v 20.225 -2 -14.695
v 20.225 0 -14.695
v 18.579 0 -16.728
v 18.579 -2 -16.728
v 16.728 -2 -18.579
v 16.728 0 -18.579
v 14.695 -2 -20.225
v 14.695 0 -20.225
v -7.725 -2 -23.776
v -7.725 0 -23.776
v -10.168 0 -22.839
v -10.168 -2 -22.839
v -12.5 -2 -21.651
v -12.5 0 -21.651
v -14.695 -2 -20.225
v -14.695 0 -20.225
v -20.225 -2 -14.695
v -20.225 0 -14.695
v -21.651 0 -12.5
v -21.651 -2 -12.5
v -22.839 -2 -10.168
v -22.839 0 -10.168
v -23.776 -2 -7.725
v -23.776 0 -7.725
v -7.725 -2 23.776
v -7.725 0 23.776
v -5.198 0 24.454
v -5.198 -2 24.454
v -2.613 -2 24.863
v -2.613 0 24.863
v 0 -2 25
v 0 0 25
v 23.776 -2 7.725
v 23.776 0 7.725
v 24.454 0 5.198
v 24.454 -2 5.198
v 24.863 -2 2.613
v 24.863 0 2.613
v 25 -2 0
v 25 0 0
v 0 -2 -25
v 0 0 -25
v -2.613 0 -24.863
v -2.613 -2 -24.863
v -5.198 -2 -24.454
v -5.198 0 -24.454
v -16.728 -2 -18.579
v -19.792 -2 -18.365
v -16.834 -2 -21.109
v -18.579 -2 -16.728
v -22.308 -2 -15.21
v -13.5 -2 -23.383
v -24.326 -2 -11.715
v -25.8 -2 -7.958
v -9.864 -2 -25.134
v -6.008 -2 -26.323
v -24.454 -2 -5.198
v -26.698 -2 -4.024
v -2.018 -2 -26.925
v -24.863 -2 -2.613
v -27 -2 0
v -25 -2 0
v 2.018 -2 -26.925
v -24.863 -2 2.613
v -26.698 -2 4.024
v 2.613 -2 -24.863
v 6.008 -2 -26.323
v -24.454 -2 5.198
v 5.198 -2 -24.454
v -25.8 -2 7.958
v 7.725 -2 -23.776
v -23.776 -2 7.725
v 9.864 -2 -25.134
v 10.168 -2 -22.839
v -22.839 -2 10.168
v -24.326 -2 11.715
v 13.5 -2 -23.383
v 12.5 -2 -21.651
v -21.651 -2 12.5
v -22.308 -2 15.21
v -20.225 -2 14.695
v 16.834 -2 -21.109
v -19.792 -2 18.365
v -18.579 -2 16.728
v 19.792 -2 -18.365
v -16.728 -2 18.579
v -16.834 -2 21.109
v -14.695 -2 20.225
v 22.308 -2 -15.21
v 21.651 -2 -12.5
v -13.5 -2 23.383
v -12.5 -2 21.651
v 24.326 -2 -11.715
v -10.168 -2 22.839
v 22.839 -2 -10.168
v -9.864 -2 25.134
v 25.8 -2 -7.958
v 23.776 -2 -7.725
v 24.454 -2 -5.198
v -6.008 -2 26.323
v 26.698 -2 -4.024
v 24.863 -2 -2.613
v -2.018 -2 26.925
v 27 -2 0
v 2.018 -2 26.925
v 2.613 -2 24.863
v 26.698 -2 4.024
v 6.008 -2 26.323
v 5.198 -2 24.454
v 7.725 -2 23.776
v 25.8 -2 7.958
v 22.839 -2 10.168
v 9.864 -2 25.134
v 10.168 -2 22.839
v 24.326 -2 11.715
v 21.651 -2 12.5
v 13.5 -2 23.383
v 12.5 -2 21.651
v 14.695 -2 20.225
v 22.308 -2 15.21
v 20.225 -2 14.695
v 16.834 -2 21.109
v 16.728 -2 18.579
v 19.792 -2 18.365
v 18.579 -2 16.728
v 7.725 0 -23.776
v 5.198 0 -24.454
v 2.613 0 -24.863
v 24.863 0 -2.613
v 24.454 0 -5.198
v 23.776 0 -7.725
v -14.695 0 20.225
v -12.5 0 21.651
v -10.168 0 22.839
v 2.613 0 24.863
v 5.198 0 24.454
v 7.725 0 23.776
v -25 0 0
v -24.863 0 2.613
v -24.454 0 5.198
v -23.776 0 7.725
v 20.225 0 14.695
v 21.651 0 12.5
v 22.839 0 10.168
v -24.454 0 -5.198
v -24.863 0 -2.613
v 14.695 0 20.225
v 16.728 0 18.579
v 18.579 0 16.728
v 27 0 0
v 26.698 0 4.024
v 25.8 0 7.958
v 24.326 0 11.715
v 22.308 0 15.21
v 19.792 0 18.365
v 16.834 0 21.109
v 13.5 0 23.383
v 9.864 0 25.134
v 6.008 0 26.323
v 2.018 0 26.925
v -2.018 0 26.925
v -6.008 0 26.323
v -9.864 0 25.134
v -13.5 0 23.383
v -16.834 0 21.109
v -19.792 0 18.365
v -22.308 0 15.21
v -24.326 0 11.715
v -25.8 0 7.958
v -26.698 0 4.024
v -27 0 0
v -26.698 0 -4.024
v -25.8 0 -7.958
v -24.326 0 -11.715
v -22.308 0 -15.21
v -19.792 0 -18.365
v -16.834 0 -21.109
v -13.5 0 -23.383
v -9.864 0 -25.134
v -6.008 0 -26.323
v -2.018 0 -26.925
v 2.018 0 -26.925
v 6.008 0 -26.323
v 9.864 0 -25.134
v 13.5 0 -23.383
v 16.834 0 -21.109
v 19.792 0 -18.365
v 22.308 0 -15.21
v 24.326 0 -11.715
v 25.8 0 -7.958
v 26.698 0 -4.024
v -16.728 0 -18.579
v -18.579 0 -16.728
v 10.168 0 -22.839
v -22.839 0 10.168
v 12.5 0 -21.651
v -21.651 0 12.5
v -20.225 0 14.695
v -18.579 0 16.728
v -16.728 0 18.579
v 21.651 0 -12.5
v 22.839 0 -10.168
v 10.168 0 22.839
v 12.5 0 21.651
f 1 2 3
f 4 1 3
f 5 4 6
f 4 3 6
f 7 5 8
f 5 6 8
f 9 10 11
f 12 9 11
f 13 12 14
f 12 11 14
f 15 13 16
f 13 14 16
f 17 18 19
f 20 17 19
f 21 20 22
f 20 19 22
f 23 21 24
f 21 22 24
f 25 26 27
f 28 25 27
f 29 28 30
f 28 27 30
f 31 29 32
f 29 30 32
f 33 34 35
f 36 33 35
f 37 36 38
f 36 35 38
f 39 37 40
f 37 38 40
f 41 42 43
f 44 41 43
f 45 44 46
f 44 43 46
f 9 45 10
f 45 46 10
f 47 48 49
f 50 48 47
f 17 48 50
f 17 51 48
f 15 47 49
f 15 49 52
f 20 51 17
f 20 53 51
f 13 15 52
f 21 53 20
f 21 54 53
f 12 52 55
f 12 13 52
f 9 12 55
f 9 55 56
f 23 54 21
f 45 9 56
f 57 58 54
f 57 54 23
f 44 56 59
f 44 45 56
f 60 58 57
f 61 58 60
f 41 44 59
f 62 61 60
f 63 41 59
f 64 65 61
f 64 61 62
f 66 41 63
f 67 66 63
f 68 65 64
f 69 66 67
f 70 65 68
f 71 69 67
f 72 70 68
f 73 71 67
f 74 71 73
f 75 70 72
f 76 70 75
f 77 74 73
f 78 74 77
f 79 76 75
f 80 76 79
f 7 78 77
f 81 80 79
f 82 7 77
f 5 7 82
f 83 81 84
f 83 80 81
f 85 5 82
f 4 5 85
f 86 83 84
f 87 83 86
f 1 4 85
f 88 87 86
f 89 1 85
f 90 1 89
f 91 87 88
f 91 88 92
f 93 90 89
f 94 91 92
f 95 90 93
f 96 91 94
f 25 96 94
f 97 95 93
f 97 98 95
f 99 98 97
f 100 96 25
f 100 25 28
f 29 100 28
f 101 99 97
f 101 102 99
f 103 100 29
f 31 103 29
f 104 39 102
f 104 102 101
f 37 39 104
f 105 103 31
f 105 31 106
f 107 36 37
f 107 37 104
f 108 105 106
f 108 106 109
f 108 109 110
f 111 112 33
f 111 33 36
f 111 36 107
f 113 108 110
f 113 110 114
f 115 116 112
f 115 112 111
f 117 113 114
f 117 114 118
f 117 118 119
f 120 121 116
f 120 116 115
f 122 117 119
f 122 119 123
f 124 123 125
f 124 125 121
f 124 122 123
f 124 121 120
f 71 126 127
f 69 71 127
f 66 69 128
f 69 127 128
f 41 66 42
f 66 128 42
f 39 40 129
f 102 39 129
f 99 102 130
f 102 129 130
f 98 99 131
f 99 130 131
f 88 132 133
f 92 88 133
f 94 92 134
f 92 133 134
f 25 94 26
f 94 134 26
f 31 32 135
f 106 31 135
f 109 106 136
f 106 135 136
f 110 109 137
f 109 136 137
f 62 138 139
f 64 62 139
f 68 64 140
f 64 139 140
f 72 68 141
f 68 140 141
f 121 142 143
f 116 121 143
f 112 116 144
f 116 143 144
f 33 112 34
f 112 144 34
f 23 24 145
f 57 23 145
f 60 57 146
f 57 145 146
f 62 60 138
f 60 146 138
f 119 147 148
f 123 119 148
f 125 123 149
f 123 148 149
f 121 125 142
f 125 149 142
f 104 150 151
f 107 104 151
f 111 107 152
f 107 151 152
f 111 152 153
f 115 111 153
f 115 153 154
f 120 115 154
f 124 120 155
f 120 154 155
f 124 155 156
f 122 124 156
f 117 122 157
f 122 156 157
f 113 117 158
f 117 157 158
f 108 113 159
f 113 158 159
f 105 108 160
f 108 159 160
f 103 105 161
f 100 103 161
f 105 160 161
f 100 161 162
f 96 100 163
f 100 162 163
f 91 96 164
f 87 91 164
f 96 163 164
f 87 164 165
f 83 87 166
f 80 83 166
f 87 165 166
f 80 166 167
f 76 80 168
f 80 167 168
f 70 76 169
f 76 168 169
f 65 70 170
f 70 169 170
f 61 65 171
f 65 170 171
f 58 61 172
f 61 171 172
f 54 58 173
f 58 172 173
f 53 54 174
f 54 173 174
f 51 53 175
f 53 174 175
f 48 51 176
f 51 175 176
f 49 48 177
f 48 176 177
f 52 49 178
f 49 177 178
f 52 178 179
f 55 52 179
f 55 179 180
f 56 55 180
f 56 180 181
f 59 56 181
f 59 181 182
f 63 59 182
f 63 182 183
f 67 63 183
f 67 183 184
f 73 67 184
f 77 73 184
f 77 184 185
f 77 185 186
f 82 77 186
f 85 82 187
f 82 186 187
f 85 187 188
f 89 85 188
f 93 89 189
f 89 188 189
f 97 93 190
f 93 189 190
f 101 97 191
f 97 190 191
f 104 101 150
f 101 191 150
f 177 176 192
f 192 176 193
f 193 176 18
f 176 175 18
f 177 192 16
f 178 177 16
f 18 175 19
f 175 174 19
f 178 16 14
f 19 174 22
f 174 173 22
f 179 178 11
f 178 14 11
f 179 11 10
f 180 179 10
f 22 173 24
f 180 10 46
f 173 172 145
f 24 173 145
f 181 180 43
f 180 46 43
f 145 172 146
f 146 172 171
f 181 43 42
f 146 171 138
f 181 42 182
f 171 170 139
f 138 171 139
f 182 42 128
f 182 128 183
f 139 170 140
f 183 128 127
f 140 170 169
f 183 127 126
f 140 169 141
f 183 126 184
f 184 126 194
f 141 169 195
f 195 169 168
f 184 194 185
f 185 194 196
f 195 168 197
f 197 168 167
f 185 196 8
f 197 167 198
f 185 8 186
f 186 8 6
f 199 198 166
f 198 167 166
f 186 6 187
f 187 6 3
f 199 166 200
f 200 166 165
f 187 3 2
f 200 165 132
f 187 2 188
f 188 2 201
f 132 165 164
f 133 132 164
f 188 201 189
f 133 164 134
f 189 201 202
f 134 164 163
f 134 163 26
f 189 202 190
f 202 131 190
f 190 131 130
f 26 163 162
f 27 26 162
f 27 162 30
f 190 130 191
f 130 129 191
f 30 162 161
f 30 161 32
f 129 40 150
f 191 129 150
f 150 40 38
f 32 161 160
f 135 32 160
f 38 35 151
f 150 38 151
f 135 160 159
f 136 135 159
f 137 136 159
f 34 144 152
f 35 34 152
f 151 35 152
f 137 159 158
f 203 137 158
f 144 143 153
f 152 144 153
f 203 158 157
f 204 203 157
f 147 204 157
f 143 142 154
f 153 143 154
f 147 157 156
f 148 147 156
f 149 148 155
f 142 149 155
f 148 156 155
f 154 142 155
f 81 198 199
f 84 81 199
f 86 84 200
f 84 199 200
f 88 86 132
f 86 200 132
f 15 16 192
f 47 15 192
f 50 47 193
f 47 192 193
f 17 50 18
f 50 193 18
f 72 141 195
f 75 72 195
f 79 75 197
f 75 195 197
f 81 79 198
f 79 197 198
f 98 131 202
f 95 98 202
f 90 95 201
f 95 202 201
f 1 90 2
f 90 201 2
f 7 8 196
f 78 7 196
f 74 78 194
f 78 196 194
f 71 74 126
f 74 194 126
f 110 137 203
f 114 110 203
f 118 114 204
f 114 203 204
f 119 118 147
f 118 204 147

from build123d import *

# Parameters (mm, degrees)
F0_R     = 27
F1_DEPTH = 2


with BuildPart() as f1:
    # F0 (on Front) → F1 (new body)
    with BuildSketch(Plane.XZ):
        Circle(F0_R)
        with BuildLine():
            ThreePointArc((23.776413, 7.725425), (24.692209, 3.910862), (25, 0))
            ThreePointArc((25, 0), (24.692209, -3.910862), (23.776413, -7.725425))
            ThreePointArc((23.776413, -7.725425), (22.275163, -11.349762), (20.225425, -14.694631))
            ThreePointArc((20.225425, -14.694631), (17.67767, -17.67767), (14.694631, -20.225425))
            ThreePointArc((14.694631, -20.225425), (11.349762, -22.275163), (7.725425, -23.776413))
            ThreePointArc((7.725425, -23.776413), (3.910862, -24.692209), (0, -25))
            ThreePointArc((0, -25), (-3.910862, -24.692209), (-7.725425, -23.776413))
            ThreePointArc((-7.725425, -23.776413), (-11.349762, -22.275163), (-14.694631, -20.225425))
            ThreePointArc((-14.694631, -20.225425), (-17.67767, -17.67767), (-20.225425, -14.694631))
            ThreePointArc((-20.225425, -14.694631), (-22.275163, -11.349762), (-23.776413, -7.725425))
            ThreePointArc((-23.776413, -7.725425), (-24.692209, -3.910862), (-25, 0))
            ThreePointArc((-25, 0), (-24.692209, 3.910862), (-23.776413, 7.725425))
            ThreePointArc((-23.776413, 7.725425), (-22.275163, 11.349762), (-20.225425, 14.694631))
            ThreePointArc((-20.225425, 14.694631), (-17.67767, 17.67767), (-14.694631, 20.225425))
            ThreePointArc((-14.694631, 20.225425), (-11.349762, 22.275163), (-7.725425, 23.776413))
            ThreePointArc((-7.725425, 23.776413), (-3.910862, 24.692209), (0, 25))
            ThreePointArc((0, 25), (3.910862, 24.692209), (7.725425, 23.776413))
            ThreePointArc((7.725425, 23.776413), (11.349762, 22.275163), (14.694631, 20.225425))
            ThreePointArc((14.694631, 20.225425), (17.67767, 17.67767), (20.225425, 14.694631))
            ThreePointArc((20.225425, 14.694631), (22.275163, 11.349762), (23.776413, 7.725425))
        make_face(mode=Mode.SUBTRACT)
    extrude(amount=F1_DEPTH)


solid = f1.part
